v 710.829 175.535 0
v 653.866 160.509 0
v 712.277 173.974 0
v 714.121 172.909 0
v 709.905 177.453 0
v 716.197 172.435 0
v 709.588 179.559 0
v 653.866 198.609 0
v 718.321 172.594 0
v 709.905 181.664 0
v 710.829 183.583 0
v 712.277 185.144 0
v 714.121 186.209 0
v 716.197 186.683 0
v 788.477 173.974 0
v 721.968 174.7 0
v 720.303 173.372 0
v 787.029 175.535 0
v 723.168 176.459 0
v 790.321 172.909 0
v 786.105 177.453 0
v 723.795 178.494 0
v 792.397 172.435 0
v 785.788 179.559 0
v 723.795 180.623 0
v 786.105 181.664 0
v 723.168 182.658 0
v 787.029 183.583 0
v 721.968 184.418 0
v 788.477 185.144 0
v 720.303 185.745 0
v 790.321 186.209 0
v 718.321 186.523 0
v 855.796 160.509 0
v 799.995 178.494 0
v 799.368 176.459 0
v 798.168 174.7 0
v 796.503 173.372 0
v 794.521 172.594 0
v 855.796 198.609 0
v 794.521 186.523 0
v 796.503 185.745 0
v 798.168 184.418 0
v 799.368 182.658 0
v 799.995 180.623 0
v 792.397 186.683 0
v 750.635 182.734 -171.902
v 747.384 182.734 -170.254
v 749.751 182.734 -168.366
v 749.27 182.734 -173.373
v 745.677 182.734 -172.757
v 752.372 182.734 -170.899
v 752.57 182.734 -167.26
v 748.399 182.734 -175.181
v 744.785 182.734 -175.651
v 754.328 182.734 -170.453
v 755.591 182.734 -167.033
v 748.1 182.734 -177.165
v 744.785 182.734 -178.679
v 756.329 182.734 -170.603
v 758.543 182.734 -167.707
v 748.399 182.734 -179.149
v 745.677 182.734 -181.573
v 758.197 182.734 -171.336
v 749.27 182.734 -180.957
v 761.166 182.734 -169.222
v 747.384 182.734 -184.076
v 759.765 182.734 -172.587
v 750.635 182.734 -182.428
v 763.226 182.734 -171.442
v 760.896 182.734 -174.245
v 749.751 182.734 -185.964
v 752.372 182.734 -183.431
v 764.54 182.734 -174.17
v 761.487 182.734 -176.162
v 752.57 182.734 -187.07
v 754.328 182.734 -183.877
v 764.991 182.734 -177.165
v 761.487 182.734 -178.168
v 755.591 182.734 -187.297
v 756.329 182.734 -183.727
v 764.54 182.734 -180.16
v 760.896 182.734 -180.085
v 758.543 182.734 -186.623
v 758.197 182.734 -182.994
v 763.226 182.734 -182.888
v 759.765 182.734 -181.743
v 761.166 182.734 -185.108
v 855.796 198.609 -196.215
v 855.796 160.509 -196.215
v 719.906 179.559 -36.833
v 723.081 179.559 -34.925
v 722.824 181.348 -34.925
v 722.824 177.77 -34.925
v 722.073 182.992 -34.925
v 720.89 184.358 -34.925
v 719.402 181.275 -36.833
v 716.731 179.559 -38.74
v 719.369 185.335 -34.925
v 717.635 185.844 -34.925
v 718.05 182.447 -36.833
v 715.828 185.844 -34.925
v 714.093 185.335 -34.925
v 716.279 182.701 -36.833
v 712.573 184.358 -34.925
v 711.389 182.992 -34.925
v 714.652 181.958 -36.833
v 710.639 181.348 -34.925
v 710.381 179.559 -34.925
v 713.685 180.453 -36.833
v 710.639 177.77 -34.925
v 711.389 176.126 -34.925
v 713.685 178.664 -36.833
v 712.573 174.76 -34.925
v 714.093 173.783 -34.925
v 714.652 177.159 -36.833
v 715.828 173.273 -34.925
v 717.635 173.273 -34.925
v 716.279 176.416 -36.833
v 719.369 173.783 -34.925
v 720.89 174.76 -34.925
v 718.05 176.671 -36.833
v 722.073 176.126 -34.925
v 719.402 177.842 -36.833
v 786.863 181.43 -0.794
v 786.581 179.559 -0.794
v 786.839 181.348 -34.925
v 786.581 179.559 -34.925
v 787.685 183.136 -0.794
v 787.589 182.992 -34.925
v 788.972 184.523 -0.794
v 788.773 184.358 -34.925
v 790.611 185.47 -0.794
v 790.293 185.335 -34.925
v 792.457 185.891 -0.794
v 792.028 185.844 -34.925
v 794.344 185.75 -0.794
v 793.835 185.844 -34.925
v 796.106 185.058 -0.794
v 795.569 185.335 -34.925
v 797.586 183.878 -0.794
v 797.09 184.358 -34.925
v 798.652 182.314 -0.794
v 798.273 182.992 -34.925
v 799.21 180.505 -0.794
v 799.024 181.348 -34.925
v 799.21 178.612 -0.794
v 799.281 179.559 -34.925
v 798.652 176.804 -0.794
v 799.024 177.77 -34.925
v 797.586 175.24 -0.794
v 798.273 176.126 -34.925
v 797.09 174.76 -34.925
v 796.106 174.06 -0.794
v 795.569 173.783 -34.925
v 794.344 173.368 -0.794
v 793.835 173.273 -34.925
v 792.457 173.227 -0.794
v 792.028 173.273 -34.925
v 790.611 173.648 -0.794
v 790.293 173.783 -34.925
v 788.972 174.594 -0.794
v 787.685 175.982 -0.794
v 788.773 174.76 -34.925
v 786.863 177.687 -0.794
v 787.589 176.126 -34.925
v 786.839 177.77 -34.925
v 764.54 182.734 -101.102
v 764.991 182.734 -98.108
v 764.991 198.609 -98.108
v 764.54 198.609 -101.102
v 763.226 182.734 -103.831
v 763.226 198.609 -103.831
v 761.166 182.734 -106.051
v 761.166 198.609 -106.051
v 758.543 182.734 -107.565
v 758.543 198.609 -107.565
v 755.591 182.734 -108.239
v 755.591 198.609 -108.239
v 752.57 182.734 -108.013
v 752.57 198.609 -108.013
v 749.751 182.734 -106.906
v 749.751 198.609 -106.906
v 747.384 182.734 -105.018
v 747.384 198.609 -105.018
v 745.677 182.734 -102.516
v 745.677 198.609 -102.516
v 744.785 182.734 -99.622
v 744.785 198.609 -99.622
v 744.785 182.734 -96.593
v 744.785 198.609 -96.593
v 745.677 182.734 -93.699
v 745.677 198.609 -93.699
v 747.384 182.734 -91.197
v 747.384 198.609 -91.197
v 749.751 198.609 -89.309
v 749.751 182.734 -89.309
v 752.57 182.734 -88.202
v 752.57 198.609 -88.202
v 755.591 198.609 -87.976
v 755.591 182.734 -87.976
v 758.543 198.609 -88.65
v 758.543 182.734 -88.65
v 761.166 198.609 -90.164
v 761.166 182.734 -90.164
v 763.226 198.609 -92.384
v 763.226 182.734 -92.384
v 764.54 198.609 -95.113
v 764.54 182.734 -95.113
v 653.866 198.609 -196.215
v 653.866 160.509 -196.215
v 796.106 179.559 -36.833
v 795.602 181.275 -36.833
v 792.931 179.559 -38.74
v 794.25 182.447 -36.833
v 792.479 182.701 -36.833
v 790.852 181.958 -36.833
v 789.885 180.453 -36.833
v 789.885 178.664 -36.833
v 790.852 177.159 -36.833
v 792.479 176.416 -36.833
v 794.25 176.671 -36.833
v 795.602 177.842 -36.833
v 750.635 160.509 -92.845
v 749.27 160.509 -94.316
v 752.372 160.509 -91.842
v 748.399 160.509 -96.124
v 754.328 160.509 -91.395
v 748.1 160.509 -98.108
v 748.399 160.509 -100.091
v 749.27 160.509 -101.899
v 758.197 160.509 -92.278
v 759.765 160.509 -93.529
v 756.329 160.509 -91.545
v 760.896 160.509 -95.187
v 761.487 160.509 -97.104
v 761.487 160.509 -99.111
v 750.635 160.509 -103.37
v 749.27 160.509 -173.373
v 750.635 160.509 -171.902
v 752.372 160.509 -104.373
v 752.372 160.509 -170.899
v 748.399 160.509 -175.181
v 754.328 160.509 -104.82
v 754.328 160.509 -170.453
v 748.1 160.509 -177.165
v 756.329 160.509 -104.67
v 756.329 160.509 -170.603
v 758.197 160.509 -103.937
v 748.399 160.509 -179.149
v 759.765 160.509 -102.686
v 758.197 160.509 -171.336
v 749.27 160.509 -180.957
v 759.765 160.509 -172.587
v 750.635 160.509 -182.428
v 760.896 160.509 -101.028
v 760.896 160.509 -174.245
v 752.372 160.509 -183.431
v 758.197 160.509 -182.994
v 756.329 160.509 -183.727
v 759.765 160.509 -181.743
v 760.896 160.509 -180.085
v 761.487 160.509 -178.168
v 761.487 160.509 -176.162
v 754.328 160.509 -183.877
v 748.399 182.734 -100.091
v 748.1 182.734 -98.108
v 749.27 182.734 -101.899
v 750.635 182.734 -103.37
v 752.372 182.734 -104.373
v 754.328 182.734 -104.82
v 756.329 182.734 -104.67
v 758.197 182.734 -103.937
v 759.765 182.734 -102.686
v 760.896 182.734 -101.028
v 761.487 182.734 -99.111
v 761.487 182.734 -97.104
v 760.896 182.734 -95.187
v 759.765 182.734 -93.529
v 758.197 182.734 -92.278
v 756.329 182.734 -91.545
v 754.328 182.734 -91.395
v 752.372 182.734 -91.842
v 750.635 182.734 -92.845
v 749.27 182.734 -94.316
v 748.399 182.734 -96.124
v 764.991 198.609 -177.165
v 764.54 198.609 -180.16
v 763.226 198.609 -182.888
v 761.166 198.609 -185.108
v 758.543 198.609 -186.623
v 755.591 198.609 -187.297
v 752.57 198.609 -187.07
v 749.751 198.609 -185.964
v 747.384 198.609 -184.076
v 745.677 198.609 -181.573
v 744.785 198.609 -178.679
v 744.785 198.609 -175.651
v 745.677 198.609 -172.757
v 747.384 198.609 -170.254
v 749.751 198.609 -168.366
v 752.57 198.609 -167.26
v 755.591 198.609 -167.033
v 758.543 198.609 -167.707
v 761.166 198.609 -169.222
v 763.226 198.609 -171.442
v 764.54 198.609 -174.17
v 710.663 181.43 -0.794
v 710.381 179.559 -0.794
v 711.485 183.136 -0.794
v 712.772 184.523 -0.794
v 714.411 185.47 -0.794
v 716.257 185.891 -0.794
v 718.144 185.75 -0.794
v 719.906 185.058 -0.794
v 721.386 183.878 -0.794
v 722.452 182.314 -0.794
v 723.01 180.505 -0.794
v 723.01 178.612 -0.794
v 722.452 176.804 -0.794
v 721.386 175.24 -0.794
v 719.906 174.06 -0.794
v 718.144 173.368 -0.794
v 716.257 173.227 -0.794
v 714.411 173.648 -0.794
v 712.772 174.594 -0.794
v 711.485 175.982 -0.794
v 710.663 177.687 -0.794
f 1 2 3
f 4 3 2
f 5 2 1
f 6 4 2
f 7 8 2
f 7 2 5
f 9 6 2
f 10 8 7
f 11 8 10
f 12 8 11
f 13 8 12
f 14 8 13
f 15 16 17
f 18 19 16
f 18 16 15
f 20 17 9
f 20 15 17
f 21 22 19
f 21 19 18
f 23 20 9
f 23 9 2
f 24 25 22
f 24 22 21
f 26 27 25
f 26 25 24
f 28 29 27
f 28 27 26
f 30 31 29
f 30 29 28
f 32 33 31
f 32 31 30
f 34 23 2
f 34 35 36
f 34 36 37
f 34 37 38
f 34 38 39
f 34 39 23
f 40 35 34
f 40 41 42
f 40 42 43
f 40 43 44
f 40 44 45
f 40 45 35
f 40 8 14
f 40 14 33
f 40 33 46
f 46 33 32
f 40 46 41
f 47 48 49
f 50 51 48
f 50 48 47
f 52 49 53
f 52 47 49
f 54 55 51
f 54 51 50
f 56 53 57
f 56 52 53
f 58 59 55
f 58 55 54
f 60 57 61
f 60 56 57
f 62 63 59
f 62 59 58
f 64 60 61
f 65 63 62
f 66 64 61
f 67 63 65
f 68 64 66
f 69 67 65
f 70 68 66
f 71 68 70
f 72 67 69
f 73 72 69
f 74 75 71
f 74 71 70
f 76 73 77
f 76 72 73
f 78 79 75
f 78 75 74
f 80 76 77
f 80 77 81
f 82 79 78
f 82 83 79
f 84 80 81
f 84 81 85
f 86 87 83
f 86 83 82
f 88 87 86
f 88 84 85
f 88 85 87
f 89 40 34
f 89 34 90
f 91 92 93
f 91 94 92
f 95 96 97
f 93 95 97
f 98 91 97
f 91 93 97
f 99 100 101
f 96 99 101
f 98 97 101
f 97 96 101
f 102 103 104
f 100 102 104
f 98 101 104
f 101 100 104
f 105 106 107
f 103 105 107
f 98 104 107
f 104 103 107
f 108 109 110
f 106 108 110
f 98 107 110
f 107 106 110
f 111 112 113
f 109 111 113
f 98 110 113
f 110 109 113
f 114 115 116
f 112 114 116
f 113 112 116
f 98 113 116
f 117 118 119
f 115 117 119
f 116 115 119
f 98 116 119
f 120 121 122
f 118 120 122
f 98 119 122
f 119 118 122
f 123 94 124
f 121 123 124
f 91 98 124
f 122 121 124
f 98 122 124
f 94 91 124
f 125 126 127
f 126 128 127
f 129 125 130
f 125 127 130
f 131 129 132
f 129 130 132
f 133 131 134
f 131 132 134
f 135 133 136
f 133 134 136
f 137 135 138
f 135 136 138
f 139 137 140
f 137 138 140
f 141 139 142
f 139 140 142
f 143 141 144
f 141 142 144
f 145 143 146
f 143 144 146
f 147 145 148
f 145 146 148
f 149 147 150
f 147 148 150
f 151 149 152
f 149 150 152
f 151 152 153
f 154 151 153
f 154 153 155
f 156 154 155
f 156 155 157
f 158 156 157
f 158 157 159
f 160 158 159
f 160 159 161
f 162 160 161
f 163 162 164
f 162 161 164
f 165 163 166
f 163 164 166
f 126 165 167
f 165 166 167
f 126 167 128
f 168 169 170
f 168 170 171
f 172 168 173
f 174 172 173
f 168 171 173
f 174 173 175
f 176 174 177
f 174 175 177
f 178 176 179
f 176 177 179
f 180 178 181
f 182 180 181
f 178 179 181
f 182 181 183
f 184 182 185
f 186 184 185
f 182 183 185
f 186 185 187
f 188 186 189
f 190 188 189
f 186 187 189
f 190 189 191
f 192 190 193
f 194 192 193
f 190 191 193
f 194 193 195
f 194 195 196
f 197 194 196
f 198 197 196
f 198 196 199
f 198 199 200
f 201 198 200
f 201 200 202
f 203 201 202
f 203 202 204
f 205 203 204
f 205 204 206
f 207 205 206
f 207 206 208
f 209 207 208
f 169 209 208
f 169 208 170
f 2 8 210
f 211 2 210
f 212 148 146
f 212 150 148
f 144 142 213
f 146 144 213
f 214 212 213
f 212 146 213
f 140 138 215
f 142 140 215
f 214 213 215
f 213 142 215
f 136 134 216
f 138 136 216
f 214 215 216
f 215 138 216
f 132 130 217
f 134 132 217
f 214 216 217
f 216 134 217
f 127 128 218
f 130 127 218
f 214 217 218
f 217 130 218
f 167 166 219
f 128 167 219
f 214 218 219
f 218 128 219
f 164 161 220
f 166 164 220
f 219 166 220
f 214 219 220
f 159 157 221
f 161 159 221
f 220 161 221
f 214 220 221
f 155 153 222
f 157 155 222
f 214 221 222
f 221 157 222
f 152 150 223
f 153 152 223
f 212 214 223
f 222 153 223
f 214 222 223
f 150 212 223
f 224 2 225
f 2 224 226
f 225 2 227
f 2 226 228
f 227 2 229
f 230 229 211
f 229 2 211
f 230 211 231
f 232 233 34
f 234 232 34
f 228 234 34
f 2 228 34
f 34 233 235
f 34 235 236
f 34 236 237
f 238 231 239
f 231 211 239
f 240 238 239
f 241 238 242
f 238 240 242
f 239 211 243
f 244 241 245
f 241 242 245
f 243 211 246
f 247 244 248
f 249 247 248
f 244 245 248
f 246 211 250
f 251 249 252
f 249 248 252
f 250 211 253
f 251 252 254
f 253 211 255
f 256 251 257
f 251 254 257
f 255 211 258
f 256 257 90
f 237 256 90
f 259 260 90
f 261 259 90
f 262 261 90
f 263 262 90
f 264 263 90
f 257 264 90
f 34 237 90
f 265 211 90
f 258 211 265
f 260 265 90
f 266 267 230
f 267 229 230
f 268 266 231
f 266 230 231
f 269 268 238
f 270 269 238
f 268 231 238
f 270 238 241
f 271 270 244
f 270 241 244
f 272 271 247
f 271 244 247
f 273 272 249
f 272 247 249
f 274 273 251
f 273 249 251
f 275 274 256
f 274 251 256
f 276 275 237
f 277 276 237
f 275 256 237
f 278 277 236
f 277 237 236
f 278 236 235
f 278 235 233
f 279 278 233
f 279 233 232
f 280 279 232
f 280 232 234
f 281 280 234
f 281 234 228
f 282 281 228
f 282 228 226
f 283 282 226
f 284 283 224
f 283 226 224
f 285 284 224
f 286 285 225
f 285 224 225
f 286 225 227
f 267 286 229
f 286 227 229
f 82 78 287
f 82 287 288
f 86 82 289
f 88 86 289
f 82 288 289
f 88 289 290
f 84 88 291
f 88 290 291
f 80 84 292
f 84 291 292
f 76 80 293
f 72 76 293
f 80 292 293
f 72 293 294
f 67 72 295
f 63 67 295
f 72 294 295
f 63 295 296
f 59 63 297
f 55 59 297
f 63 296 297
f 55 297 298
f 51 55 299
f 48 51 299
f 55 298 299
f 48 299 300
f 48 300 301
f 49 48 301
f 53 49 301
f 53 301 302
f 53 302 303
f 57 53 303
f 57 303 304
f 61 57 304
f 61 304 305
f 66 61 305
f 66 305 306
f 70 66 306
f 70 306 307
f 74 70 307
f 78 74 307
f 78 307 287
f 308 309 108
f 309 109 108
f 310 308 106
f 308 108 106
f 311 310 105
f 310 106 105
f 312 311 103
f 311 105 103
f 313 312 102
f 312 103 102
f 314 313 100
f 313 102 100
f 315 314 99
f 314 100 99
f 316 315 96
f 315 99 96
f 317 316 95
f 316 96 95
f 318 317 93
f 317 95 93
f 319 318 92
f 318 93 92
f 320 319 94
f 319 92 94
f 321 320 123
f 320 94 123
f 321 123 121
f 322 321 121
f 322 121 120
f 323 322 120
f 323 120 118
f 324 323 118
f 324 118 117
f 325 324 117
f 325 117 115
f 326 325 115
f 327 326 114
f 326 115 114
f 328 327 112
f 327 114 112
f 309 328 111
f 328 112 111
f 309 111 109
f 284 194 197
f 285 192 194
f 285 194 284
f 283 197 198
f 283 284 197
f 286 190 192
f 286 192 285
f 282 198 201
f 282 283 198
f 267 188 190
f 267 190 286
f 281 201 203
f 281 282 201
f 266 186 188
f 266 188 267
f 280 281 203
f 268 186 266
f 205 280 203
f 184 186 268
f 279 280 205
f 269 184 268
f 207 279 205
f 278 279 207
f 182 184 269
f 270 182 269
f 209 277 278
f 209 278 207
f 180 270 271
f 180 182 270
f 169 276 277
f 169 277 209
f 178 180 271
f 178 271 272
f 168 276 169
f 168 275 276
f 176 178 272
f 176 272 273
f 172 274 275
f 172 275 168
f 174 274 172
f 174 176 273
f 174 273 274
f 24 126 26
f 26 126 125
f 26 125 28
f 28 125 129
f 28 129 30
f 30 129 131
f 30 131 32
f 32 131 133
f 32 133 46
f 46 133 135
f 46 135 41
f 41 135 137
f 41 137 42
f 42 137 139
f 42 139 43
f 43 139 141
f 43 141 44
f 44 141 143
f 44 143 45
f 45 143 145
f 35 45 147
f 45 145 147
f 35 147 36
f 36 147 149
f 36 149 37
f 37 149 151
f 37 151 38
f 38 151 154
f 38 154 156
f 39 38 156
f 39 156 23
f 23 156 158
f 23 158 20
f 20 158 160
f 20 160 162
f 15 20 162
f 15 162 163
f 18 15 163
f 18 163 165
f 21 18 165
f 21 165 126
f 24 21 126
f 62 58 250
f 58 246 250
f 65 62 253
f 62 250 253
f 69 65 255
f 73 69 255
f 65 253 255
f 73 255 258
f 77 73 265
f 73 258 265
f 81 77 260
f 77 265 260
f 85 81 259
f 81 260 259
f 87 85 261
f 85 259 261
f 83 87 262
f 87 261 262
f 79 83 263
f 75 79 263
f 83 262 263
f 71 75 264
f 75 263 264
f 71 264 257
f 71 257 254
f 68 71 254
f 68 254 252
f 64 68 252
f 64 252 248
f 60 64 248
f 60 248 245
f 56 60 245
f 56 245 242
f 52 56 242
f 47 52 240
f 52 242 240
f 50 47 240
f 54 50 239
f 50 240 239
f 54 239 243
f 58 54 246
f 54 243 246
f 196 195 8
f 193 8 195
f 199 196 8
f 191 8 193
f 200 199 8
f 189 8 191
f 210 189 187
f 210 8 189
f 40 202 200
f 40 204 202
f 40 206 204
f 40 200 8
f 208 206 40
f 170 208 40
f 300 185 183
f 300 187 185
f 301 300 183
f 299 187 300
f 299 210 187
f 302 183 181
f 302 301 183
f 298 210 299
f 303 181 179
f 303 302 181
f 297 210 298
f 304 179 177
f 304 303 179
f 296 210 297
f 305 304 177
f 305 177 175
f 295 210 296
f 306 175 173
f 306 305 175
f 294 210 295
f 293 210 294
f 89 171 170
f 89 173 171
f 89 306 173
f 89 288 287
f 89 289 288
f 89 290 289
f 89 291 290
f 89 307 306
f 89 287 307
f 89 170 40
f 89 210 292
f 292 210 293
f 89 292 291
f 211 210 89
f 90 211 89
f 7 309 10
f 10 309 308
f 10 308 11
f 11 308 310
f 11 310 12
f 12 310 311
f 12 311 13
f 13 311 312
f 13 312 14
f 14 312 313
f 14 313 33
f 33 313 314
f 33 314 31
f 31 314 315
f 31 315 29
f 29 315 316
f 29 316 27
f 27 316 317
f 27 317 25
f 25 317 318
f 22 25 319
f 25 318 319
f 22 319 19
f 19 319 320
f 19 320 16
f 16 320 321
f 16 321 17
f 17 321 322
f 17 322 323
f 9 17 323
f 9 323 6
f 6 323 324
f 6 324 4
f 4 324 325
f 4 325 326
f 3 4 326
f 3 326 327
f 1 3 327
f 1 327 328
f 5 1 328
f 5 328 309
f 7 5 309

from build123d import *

# Parameters (mm, degrees)
F0_W           = 201.93
F0_H           = 196.215
F0_R           = 10.16
F0_R_2         = 6.604
F1_DEPTH       = 38.1
F2_D           = 13.462
F2_DEPTH       = 50.8
F2_CBORE_D     = 20.32
F2_CBORE_DEPTH = 15.875
F2_TIP         = 4.0443928267
F3_ANGLE       = -90
F5_D           = 12.7
F5_DEPTH       = 34.925
F5_CSINK_D     = 14.2875
F5_CSINK_ANGLE = 90
F5_TIP         = 3.8154649308


with BuildPart() as f1:
    # F0 (on Top) → F1 (new body)
    with BuildSketch(Plane.XY):
        with Locations((754.8313072, 347.5162722)):
            Rectangle(F0_W, F0_H)
        with Locations((754.8313072, 268.4587722)):
            Circle(F0_R, mode=Mode.SUBTRACT)
        with Locations((754.8313072, 347.5162722)):
            Circle(F0_R, mode=Mode.SUBTRACT)
        with Locations((754.8313072, 426.5737722)):
            Circle(F0_R, mode=Mode.SUBTRACT)
        with Locations((754.8313072, 426.5737722)):
            Circle(F0_R)
        with Locations((754.8313072, 426.5737722)):
            Circle(F0_R_2, mode=Mode.SUBTRACT)
        with Locations((754.8313072, 347.5162722)):
            Circle(F0_R)
        with Locations((754.8313072, 347.5162722)):
            Circle(F0_R_2, mode=Mode.SUBTRACT)
        with Locations((754.8313072, 347.5162722)):
            Circle(F0_R_2)
        with Locations((754.8313072, 426.5737722)):
            Circle(F0_R_2)
        with Locations((754.8313072, 268.4587722)):
            Circle(F0_R)
        with Locations((754.8313072, 268.4587722)):
            Circle(F0_R_2, mode=Mode.SUBTRACT)
        with Locations((754.8313072, 268.4587722)):
            Circle(F0_R_2)
    extrude(amount=-F1_DEPTH)

    # F2
    with Locations(Plane.XY):
        with Locations((754.8313072, 426.5737722), (754.8313072, 347.5162722)):
            CounterBoreHole(F2_D / 2, F2_CBORE_D / 2, F2_CBORE_DEPTH, depth=F2_DEPTH)
            with Locations((0, 0, -(F2_DEPTH + F2_TIP / 2))):  # 118° drill point
                Cone(0, F2_D / 2, F2_TIP, mode=Mode.SUBTRACT)


with BuildPart() as f1_1:
    # F3: moved
    add(f1.part.rotate(Axis((754.8313072, 249.4087722, 0), (1, 0, 0)), F3_ANGLE))


with BuildPart() as f1_2:
    # F4: moved
    add(f1_1.part.moved(Location((0, -50.8, 0))))

    # F5
    with Locations(Plane.XY):
        with Locations((716.7313072, 179.5587722), (792.9313072, 179.5587722)):
            CounterSinkHole(F5_D / 2, F5_CSINK_D / 2, depth=F5_DEPTH, counter_sink_angle=F5_CSINK_ANGLE)
            with Locations((0, 0, -(F5_DEPTH + F5_TIP / 2))):  # 118° drill point
                Cone(0, F5_D / 2, F5_TIP, mode=Mode.SUBTRACT)


solid = f1_2.part
